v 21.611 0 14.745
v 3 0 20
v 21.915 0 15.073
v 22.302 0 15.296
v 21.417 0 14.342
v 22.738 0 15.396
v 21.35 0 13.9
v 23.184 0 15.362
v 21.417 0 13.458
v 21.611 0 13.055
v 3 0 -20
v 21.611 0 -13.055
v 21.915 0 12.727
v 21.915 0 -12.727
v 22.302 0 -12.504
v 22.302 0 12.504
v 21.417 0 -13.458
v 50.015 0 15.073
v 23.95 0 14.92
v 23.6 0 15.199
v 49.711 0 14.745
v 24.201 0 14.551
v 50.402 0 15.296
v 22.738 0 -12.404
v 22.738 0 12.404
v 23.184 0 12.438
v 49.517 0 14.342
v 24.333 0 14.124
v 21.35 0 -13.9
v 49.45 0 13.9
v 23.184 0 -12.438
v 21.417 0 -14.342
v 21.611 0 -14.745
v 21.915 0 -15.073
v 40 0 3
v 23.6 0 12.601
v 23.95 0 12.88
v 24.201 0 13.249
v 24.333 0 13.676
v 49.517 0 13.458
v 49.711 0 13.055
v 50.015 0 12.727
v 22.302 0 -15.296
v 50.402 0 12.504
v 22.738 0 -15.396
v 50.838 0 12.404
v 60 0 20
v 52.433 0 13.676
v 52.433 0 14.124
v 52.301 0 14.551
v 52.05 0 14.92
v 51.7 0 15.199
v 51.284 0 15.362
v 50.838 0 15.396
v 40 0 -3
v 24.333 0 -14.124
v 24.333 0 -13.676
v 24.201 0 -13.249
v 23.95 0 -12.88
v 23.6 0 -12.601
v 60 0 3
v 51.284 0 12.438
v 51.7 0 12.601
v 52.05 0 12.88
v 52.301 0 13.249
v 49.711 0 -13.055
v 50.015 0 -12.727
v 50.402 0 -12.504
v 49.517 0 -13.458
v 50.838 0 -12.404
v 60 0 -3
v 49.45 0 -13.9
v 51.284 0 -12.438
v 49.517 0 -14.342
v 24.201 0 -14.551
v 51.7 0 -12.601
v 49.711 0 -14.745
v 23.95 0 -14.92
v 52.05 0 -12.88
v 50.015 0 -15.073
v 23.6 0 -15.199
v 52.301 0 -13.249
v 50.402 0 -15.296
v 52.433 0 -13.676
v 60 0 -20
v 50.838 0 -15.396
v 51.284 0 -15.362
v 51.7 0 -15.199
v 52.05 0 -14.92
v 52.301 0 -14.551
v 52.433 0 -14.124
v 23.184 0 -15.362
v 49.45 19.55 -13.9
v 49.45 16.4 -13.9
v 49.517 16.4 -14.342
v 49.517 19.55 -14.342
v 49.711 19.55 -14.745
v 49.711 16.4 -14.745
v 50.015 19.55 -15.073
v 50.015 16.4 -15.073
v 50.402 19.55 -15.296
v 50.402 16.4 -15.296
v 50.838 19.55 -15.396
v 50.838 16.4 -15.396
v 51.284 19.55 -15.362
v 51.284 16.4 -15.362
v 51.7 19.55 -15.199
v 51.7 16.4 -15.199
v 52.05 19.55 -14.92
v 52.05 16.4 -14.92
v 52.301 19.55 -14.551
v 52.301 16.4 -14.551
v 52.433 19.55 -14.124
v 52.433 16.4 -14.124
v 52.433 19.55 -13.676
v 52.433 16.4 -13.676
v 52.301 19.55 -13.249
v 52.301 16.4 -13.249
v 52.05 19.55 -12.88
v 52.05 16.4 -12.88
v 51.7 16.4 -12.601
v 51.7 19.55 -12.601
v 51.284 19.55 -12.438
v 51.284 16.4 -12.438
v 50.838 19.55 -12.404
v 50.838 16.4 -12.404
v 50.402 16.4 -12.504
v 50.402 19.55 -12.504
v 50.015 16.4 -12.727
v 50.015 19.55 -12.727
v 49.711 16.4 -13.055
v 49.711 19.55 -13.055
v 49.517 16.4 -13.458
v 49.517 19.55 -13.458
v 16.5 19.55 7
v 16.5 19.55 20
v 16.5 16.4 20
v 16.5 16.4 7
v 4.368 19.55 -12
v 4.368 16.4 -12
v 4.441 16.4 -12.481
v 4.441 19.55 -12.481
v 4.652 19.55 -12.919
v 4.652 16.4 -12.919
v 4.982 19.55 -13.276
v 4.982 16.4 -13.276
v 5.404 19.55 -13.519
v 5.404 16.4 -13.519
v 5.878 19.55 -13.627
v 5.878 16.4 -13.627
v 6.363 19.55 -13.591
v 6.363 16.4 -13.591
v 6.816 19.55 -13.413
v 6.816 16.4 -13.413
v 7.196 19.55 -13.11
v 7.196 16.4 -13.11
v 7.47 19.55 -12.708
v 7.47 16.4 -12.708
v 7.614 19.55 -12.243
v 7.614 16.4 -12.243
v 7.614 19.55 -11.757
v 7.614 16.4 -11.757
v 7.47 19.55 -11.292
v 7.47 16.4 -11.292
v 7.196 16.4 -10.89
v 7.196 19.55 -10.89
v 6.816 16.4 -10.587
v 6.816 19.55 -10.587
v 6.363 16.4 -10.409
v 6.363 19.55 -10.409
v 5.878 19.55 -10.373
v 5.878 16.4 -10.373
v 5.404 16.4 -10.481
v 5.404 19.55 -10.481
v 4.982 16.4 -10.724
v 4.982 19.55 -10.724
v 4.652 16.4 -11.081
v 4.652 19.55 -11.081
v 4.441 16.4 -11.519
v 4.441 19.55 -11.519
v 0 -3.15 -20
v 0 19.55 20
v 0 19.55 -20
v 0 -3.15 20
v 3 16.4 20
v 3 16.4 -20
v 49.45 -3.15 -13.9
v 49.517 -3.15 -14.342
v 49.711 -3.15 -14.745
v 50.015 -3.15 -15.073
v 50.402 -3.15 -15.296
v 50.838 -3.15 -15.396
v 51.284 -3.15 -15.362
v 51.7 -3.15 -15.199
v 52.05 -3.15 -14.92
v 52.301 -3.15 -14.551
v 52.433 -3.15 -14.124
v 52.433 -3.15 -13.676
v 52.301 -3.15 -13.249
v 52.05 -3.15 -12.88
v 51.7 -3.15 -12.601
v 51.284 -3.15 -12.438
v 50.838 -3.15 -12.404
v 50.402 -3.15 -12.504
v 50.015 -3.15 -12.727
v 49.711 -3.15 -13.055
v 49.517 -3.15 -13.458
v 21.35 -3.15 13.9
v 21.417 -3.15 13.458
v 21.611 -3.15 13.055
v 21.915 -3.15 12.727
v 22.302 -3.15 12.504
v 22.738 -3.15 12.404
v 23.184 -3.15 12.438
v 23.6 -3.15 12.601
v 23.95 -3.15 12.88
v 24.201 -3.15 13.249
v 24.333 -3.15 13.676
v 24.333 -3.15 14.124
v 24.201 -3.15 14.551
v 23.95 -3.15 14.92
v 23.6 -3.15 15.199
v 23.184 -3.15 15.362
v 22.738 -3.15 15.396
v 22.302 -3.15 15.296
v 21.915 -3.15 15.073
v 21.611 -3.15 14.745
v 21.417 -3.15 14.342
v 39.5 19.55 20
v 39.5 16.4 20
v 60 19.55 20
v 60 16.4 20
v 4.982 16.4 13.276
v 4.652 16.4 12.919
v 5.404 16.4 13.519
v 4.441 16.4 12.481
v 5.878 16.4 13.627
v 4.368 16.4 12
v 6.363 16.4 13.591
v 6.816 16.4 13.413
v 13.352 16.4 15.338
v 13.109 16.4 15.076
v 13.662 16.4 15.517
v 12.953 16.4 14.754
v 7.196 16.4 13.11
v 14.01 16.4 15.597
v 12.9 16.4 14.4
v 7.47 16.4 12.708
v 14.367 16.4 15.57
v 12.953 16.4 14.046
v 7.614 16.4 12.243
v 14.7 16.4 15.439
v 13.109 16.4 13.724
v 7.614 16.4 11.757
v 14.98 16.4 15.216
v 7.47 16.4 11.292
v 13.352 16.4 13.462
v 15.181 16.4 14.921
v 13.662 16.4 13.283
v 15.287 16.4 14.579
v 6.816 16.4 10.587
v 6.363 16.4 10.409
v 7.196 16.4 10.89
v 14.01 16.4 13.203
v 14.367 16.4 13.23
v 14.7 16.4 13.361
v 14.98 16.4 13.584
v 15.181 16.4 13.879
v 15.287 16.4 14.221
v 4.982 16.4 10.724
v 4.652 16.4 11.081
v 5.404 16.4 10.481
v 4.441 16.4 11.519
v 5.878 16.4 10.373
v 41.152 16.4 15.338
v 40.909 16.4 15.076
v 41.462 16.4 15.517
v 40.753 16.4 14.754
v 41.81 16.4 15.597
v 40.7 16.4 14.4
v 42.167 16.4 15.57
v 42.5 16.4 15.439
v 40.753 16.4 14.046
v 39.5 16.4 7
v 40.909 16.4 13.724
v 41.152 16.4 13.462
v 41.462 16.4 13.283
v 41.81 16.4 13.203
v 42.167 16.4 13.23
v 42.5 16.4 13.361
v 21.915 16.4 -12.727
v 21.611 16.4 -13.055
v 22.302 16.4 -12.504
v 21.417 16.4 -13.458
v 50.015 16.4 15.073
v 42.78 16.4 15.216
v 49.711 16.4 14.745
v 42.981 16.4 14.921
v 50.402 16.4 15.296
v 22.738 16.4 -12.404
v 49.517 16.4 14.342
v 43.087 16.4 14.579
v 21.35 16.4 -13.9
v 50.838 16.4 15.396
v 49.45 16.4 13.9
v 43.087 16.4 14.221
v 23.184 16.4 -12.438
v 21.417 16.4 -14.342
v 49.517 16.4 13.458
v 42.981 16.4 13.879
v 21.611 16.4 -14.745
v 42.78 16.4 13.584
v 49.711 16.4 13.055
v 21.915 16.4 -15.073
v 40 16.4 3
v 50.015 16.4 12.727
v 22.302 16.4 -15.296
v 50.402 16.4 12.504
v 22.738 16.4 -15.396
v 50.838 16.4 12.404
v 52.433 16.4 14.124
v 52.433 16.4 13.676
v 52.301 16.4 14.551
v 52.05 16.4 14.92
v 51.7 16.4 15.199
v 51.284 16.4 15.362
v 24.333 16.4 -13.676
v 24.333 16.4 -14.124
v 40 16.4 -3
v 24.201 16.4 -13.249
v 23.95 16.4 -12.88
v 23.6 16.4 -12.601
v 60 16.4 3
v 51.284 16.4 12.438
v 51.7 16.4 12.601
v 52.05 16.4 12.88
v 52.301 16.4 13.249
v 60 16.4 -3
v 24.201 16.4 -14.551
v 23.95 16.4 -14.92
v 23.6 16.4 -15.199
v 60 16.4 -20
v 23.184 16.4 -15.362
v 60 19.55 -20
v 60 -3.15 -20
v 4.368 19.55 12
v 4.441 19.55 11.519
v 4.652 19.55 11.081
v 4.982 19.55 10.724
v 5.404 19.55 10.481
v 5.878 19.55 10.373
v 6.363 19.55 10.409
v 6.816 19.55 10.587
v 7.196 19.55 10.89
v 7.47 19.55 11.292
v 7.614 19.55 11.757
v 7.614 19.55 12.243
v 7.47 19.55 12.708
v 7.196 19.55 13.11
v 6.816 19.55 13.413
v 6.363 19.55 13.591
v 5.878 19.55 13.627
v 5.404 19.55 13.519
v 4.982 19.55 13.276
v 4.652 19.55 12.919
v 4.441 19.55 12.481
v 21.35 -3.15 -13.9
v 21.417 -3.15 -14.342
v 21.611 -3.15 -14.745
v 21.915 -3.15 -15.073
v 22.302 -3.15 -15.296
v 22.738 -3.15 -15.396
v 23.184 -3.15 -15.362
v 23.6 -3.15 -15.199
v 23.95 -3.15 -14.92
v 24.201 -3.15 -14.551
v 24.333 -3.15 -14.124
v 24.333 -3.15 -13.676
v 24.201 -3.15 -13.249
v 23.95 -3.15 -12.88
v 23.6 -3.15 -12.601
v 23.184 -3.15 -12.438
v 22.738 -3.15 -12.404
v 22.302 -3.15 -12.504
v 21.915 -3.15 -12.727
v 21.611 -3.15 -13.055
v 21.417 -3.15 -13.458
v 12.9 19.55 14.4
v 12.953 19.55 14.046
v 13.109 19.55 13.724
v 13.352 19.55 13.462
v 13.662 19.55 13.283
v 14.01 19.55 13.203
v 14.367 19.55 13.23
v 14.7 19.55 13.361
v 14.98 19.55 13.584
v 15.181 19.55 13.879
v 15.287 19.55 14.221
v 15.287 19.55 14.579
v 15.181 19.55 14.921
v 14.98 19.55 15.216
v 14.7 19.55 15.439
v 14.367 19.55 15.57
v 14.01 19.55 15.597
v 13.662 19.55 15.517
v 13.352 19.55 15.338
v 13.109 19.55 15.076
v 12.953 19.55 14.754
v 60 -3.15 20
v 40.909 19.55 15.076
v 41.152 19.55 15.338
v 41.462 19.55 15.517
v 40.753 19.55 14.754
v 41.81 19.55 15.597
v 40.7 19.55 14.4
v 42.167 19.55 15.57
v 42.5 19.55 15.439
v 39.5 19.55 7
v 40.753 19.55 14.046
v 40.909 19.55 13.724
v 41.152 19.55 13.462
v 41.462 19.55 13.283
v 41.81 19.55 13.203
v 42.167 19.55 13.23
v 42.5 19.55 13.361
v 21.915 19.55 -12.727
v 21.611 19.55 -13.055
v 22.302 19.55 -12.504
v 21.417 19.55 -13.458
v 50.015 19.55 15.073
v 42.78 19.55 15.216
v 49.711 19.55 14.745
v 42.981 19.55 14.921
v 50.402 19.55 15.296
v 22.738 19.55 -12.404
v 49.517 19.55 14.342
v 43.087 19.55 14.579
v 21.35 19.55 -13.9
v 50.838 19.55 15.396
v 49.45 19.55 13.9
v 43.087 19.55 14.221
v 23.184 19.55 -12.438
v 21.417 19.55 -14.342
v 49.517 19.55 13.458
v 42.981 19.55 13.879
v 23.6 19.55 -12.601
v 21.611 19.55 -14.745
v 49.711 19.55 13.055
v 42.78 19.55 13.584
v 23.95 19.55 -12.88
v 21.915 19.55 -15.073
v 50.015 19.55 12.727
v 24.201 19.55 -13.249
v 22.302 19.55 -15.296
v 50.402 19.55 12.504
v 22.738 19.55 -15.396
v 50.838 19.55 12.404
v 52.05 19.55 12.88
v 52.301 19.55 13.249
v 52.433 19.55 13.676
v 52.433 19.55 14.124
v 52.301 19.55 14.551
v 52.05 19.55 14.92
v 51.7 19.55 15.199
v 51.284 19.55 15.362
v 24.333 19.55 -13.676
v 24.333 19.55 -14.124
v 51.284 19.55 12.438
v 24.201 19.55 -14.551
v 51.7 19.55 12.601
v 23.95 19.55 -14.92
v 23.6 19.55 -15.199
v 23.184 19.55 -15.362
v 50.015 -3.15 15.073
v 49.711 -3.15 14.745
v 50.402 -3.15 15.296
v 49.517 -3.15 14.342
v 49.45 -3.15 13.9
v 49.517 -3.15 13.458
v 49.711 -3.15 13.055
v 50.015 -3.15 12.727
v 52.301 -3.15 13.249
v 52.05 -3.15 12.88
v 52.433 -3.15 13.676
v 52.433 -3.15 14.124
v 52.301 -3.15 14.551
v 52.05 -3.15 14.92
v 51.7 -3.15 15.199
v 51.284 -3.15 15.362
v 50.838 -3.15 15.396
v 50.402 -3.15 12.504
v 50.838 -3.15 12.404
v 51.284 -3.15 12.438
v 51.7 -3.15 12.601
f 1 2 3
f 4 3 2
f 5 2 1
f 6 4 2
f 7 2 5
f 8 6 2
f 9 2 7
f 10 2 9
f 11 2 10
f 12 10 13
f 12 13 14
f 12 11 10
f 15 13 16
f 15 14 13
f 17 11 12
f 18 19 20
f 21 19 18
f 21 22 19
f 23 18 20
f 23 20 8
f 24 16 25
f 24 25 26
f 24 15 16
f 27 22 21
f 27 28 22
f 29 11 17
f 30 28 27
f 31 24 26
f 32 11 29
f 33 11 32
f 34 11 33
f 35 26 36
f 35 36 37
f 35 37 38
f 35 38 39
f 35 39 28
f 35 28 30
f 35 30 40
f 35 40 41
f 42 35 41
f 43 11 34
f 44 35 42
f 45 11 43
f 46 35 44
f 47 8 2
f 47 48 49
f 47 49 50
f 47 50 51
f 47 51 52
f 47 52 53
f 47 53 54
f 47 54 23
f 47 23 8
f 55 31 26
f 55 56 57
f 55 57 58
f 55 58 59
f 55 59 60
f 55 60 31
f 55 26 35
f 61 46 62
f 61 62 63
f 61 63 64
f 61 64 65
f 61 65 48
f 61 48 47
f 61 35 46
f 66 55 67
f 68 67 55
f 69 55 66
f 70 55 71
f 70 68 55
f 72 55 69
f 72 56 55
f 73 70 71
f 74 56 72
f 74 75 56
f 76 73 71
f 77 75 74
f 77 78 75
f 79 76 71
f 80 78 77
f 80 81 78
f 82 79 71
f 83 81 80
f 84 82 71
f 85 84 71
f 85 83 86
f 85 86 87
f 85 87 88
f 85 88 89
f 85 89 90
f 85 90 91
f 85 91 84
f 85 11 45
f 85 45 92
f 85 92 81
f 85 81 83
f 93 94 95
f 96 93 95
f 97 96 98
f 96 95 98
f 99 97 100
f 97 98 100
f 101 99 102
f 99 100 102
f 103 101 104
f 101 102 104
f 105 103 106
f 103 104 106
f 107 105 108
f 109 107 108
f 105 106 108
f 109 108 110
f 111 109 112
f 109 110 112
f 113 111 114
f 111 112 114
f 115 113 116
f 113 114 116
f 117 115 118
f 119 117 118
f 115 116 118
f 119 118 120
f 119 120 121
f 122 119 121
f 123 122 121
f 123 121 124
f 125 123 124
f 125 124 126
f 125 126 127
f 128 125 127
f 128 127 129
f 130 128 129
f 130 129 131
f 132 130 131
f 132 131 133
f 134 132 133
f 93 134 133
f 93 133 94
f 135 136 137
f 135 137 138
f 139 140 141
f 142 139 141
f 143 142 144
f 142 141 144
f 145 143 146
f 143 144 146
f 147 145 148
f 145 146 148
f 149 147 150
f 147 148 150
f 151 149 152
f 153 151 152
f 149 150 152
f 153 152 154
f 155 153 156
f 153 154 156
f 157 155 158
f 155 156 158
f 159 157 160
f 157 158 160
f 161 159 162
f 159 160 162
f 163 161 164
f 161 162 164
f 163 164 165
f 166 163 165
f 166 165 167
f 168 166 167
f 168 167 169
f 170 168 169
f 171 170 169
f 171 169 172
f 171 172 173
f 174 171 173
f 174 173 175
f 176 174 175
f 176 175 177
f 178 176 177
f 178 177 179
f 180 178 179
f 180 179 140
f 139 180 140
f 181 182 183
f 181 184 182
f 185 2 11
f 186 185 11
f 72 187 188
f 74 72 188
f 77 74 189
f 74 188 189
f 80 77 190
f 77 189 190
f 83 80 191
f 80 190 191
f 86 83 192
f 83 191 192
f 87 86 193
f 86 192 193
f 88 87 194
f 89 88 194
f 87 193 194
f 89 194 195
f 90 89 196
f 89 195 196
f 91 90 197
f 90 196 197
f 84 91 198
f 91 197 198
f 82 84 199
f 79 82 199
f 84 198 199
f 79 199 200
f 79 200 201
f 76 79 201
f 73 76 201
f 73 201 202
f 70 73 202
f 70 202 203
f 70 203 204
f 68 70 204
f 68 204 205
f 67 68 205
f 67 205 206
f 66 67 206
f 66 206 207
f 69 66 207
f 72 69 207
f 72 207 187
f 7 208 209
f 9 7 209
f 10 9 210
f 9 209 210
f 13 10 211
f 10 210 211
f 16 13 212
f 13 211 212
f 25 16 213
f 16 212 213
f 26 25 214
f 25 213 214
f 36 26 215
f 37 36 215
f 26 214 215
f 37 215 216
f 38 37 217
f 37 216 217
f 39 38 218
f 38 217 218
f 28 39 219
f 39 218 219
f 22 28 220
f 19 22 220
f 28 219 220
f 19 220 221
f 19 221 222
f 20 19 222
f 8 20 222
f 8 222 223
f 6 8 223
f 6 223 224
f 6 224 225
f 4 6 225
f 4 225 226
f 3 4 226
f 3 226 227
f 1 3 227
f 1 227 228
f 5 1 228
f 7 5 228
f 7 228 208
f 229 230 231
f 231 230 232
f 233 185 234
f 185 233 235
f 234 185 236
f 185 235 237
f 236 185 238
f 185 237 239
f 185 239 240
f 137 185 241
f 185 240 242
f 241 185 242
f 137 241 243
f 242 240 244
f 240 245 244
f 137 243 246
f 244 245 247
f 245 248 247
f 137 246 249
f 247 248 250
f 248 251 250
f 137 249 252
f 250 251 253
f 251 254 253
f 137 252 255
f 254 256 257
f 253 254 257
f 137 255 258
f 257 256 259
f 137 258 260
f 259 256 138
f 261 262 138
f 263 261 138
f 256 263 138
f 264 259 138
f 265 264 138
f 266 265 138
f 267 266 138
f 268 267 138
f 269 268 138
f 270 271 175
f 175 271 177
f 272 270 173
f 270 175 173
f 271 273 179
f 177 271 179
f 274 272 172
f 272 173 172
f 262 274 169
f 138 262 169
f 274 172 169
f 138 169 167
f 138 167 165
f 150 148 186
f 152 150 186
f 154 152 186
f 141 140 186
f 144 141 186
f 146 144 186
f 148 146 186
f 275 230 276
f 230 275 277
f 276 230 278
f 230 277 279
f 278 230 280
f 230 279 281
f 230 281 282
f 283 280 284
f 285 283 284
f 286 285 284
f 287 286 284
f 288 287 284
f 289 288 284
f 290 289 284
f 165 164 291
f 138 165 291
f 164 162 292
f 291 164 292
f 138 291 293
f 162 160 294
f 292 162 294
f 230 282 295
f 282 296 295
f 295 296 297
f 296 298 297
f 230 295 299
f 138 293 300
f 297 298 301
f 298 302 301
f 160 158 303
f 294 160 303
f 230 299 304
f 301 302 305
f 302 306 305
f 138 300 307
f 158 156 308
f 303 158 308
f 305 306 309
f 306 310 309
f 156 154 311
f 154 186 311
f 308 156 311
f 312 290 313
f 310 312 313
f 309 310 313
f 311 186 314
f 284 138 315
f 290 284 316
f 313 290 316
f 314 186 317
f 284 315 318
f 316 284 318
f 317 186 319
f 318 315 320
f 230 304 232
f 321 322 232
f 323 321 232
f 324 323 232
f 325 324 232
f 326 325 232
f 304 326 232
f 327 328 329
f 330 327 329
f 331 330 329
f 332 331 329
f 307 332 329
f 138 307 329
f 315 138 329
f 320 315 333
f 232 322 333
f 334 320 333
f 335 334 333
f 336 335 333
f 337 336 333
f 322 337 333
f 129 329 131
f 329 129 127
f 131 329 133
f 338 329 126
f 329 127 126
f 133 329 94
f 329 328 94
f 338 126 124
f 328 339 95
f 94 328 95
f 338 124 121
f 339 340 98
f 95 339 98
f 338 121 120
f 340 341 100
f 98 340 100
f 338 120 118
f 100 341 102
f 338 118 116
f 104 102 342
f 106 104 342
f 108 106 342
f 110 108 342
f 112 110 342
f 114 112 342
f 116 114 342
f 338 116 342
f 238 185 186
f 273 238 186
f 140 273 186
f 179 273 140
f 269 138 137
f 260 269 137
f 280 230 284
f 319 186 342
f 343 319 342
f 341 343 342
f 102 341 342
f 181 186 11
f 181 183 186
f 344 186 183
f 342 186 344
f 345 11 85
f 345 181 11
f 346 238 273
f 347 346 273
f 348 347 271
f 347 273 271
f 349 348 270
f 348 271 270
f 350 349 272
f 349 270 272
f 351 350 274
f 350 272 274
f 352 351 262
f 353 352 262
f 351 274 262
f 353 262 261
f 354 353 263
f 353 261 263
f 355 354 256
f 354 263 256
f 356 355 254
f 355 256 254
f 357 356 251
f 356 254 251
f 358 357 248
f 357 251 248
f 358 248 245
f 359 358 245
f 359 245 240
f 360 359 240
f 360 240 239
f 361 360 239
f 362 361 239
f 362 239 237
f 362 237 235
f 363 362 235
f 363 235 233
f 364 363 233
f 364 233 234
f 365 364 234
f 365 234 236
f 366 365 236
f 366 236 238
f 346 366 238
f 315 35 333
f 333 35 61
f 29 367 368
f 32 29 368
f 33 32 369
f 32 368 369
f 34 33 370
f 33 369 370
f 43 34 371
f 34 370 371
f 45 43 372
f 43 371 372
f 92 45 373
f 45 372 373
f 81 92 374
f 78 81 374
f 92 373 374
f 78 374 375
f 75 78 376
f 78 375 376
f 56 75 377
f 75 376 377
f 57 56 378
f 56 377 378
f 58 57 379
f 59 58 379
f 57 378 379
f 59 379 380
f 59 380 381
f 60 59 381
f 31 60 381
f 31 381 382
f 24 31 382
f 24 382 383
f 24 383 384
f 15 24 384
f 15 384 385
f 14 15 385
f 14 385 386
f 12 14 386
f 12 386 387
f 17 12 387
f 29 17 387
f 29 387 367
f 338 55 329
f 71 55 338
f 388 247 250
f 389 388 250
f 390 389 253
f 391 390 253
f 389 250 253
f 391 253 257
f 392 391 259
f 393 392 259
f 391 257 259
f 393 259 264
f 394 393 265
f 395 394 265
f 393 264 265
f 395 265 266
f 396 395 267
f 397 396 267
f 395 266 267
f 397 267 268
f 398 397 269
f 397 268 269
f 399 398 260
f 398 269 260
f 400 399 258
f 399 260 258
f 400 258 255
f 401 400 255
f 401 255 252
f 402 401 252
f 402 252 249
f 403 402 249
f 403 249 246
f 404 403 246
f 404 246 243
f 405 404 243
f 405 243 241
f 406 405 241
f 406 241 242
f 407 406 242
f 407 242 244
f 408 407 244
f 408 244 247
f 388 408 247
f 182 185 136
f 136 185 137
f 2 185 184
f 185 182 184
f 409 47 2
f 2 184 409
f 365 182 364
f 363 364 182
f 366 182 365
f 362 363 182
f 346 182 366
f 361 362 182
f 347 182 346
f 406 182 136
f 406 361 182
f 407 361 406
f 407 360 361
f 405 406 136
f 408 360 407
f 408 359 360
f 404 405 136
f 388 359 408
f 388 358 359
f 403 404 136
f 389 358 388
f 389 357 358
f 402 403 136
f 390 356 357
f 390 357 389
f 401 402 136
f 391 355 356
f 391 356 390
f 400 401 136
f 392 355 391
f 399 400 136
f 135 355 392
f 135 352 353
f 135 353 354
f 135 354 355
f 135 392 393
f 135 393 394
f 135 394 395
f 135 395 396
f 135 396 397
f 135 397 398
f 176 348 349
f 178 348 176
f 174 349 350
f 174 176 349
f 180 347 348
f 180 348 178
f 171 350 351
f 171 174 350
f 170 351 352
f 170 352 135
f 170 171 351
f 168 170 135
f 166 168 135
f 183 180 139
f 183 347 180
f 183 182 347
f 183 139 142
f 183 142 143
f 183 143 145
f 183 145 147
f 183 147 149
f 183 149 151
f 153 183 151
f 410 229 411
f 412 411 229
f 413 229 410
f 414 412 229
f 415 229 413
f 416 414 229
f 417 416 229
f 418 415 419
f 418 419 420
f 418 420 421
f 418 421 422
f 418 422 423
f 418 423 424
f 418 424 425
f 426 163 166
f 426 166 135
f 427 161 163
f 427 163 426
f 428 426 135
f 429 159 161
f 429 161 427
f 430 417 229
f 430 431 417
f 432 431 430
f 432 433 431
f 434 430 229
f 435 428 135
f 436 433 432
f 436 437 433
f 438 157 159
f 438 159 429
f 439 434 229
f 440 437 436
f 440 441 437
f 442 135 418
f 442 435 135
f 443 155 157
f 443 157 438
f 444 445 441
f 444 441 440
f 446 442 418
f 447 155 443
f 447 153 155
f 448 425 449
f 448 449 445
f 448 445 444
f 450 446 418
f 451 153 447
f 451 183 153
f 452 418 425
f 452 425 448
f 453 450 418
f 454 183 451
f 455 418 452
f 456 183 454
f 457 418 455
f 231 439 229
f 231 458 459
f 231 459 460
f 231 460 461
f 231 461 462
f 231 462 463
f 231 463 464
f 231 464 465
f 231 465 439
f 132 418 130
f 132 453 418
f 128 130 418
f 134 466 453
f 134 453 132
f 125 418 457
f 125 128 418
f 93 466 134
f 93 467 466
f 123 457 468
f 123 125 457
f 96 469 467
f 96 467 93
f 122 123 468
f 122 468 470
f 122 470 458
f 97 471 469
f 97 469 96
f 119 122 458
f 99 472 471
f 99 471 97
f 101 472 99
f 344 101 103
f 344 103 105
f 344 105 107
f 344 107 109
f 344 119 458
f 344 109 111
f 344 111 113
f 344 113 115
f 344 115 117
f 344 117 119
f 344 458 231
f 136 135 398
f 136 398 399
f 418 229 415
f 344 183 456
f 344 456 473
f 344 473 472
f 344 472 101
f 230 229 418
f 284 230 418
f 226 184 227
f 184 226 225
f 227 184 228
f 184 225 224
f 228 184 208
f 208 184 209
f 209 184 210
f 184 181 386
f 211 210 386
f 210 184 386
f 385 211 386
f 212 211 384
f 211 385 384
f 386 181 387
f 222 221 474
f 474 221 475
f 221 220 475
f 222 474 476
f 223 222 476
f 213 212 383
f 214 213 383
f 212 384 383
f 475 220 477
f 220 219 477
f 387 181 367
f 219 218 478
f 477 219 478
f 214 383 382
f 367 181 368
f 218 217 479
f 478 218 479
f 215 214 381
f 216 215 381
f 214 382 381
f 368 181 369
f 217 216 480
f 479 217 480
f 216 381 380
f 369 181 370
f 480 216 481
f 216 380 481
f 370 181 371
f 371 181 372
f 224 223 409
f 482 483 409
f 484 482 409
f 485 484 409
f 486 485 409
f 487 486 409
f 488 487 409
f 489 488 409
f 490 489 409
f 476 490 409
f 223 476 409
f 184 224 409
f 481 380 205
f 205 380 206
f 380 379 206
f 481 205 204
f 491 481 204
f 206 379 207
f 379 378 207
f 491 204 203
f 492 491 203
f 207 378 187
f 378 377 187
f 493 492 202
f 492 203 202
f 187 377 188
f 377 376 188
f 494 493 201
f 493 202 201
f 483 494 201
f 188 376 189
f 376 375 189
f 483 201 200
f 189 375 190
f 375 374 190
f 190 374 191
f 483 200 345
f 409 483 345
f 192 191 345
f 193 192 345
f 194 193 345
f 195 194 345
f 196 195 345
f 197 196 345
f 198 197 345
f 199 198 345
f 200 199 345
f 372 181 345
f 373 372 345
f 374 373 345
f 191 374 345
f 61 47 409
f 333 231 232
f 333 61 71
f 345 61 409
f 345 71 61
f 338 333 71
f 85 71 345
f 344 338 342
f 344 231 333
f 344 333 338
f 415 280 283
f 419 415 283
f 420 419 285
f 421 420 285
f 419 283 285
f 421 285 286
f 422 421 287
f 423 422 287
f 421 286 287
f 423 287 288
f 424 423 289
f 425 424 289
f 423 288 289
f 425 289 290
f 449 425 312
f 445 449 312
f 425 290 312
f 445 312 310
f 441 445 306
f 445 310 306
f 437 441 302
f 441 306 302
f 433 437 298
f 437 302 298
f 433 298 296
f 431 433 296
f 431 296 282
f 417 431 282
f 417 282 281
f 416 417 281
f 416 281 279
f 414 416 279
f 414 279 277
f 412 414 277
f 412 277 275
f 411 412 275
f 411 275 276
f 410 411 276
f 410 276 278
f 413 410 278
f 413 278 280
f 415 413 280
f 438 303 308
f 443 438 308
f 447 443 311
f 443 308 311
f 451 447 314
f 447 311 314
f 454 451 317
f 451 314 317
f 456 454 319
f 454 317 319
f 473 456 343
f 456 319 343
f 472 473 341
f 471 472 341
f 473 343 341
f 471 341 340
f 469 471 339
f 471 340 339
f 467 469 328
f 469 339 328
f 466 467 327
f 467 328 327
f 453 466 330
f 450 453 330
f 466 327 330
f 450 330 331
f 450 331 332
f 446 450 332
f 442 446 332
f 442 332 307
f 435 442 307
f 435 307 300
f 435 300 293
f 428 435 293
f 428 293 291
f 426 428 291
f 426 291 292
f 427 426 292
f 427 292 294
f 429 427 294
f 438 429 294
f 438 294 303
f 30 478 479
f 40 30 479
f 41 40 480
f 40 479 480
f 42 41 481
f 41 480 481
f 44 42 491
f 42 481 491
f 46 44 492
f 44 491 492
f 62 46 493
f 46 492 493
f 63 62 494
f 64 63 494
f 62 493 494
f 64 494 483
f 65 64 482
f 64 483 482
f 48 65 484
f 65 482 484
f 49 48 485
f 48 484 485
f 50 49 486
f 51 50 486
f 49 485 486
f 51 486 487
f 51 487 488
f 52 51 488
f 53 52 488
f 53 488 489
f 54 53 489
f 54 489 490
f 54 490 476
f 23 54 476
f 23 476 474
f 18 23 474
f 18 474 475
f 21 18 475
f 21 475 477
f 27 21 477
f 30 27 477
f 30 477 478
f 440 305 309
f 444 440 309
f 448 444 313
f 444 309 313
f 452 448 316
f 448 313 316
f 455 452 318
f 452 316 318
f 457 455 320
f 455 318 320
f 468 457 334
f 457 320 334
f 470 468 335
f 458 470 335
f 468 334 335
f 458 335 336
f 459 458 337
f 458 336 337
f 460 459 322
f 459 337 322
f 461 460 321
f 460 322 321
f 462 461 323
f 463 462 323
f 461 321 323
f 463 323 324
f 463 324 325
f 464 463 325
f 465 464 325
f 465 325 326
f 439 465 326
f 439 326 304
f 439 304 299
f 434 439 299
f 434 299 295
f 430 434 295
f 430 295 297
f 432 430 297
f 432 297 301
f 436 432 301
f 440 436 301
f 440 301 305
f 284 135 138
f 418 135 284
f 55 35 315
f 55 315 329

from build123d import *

# Parameters (mm, degrees)
SKETCH1_W                 = 60
SKETCH1_H                 = 40
BOSS_EXTRUDE1_DEPTH       = 3.15
BOSS_EXTRUDE2_START       = 16.4
SKETCH1_2_W               = 60
SKETCH1_2_H               = 40
BOSS_EXTRUDE2_DEPTH       = 3.15
SKETCH2_W                 = 3
SKETCH2_H                 = 40
SKETCH2_W_2               = 20
SKETCH2_H_2               = 6
BOSS_EXTRUDE3_DEPTH       = 16.4
M2_CLEARANCE_HOLE1_D      = 2.4
M2_CLEARANCE_HOLE1_DEPTH  = 5
M2_CLEARANCE_HOLE1_TIP    = 0.721032743
F_3_0MM_DOWEL_HOLE1_D     = 3
SKETCH5_W                 = 23
SKETCH5_H                 = 13
CUT_EXTRUDE1_DEPTH        = 7
F_4_CLEARANCE_HOLE2_D     = 3.2639
F_4_CLEARANCE_HOLE2_DEPTH = 10
F_4_CLEARANCE_HOLE2_TIP   = 0.980574487


with BuildPart() as part:
    # Sketch1 → Boss-Extrude1 (new body)
    with BuildSketch(Plane(origin=(0, 0, 0), x_dir=(1, 0, 0), z_dir=(0, 1, 0))):
        with Locations((30, 0)):
            Rectangle(SKETCH1_W, SKETCH1_H)
    extrude(amount=-BOSS_EXTRUDE1_DEPTH)



with BuildPart() as body_2:
    # Sketch1<2> → Boss-Extrude2 (new body)
    with BuildSketch(Plane(origin=(0, 0, 0), x_dir=(1, 0, 0), z_dir=(0, 1, 0)).offset(BOSS_EXTRUDE2_START)):
        with Locations((30, 0)):
            Rectangle(SKETCH1_2_W, SKETCH1_2_H)
    extrude(amount=BOSS_EXTRUDE2_DEPTH)


with BuildPart() as part_1:
    add(part.part)

    add(body_2.part)  # Boss-Extrude3 merges body 2
    # Sketch2 → Boss-Extrude3 (add)
    with BuildSketch(Plane(origin=(0, 0, 0), x_dir=(1, 0, 0), z_dir=(0, 1, 0))):
        with Locations((1.5, 0)):
            Rectangle(SKETCH2_W, SKETCH2_H)
        with Locations((50, 0)):
            Rectangle(SKETCH2_W_2, SKETCH2_H_2)
    extrude(amount=BOSS_EXTRUDE3_DEPTH)

    # M2 Clearance Hole1
    with Locations(Plane(origin=(0, 19.55, 0), x_dir=(1, 0, 0), z_dir=(0, 1, 0))):
        with Locations((14.1, -14.4), (41.9, -14.4)):
            Hole(M2_CLEARANCE_HOLE1_D / 2, depth=M2_CLEARANCE_HOLE1_DEPTH)
            with Locations((0, 0, -(M2_CLEARANCE_HOLE1_DEPTH + M2_CLEARANCE_HOLE1_TIP / 2))):  # 118° drill point
                Cone(0, M2_CLEARANCE_HOLE1_D / 2, M2_CLEARANCE_HOLE1_TIP, mode=Mode.SUBTRACT)

    # Ø3.0mm Dowel Hole1 (through all)
    with Locations(Plane(origin=(0, 19.55, 0), x_dir=(1, 0, 0), z_dir=(0, 1, 0))):
        with Locations((50.95, -13.9), (22.85, 13.9), (50.95, 13.9), (22.85, -13.9)):
            Hole(F_3_0MM_DOWEL_HOLE1_D / 2)

    # Sketch5 → Cut-Extrude1 (cut)
    with BuildSketch(Plane(origin=(0, 19.55, 0), x_dir=(1, 0, 0), z_dir=(0, 1, 0))):
        with Locations((28, -13.5)):
            Rectangle(SKETCH5_W, SKETCH5_H)
    extrude(amount=-CUT_EXTRUDE1_DEPTH, mode=Mode.SUBTRACT)

    # #4 Clearance Hole2
    with Locations(Plane(origin=(0, 19.55, 0), x_dir=(1, 0, 0), z_dir=(0, 1, 0))):
        with Locations((6, 12), (6, -12)):
            Hole(F_4_CLEARANCE_HOLE2_D / 2, depth=F_4_CLEARANCE_HOLE2_DEPTH)
            with Locations((0, 0, -(F_4_CLEARANCE_HOLE2_DEPTH + F_4_CLEARANCE_HOLE2_TIP / 2))):  # 118° drill point
                Cone(0, F_4_CLEARANCE_HOLE2_D / 2, F_4_CLEARANCE_HOLE2_TIP, mode=Mode.SUBTRACT)


solid = part_1.part
